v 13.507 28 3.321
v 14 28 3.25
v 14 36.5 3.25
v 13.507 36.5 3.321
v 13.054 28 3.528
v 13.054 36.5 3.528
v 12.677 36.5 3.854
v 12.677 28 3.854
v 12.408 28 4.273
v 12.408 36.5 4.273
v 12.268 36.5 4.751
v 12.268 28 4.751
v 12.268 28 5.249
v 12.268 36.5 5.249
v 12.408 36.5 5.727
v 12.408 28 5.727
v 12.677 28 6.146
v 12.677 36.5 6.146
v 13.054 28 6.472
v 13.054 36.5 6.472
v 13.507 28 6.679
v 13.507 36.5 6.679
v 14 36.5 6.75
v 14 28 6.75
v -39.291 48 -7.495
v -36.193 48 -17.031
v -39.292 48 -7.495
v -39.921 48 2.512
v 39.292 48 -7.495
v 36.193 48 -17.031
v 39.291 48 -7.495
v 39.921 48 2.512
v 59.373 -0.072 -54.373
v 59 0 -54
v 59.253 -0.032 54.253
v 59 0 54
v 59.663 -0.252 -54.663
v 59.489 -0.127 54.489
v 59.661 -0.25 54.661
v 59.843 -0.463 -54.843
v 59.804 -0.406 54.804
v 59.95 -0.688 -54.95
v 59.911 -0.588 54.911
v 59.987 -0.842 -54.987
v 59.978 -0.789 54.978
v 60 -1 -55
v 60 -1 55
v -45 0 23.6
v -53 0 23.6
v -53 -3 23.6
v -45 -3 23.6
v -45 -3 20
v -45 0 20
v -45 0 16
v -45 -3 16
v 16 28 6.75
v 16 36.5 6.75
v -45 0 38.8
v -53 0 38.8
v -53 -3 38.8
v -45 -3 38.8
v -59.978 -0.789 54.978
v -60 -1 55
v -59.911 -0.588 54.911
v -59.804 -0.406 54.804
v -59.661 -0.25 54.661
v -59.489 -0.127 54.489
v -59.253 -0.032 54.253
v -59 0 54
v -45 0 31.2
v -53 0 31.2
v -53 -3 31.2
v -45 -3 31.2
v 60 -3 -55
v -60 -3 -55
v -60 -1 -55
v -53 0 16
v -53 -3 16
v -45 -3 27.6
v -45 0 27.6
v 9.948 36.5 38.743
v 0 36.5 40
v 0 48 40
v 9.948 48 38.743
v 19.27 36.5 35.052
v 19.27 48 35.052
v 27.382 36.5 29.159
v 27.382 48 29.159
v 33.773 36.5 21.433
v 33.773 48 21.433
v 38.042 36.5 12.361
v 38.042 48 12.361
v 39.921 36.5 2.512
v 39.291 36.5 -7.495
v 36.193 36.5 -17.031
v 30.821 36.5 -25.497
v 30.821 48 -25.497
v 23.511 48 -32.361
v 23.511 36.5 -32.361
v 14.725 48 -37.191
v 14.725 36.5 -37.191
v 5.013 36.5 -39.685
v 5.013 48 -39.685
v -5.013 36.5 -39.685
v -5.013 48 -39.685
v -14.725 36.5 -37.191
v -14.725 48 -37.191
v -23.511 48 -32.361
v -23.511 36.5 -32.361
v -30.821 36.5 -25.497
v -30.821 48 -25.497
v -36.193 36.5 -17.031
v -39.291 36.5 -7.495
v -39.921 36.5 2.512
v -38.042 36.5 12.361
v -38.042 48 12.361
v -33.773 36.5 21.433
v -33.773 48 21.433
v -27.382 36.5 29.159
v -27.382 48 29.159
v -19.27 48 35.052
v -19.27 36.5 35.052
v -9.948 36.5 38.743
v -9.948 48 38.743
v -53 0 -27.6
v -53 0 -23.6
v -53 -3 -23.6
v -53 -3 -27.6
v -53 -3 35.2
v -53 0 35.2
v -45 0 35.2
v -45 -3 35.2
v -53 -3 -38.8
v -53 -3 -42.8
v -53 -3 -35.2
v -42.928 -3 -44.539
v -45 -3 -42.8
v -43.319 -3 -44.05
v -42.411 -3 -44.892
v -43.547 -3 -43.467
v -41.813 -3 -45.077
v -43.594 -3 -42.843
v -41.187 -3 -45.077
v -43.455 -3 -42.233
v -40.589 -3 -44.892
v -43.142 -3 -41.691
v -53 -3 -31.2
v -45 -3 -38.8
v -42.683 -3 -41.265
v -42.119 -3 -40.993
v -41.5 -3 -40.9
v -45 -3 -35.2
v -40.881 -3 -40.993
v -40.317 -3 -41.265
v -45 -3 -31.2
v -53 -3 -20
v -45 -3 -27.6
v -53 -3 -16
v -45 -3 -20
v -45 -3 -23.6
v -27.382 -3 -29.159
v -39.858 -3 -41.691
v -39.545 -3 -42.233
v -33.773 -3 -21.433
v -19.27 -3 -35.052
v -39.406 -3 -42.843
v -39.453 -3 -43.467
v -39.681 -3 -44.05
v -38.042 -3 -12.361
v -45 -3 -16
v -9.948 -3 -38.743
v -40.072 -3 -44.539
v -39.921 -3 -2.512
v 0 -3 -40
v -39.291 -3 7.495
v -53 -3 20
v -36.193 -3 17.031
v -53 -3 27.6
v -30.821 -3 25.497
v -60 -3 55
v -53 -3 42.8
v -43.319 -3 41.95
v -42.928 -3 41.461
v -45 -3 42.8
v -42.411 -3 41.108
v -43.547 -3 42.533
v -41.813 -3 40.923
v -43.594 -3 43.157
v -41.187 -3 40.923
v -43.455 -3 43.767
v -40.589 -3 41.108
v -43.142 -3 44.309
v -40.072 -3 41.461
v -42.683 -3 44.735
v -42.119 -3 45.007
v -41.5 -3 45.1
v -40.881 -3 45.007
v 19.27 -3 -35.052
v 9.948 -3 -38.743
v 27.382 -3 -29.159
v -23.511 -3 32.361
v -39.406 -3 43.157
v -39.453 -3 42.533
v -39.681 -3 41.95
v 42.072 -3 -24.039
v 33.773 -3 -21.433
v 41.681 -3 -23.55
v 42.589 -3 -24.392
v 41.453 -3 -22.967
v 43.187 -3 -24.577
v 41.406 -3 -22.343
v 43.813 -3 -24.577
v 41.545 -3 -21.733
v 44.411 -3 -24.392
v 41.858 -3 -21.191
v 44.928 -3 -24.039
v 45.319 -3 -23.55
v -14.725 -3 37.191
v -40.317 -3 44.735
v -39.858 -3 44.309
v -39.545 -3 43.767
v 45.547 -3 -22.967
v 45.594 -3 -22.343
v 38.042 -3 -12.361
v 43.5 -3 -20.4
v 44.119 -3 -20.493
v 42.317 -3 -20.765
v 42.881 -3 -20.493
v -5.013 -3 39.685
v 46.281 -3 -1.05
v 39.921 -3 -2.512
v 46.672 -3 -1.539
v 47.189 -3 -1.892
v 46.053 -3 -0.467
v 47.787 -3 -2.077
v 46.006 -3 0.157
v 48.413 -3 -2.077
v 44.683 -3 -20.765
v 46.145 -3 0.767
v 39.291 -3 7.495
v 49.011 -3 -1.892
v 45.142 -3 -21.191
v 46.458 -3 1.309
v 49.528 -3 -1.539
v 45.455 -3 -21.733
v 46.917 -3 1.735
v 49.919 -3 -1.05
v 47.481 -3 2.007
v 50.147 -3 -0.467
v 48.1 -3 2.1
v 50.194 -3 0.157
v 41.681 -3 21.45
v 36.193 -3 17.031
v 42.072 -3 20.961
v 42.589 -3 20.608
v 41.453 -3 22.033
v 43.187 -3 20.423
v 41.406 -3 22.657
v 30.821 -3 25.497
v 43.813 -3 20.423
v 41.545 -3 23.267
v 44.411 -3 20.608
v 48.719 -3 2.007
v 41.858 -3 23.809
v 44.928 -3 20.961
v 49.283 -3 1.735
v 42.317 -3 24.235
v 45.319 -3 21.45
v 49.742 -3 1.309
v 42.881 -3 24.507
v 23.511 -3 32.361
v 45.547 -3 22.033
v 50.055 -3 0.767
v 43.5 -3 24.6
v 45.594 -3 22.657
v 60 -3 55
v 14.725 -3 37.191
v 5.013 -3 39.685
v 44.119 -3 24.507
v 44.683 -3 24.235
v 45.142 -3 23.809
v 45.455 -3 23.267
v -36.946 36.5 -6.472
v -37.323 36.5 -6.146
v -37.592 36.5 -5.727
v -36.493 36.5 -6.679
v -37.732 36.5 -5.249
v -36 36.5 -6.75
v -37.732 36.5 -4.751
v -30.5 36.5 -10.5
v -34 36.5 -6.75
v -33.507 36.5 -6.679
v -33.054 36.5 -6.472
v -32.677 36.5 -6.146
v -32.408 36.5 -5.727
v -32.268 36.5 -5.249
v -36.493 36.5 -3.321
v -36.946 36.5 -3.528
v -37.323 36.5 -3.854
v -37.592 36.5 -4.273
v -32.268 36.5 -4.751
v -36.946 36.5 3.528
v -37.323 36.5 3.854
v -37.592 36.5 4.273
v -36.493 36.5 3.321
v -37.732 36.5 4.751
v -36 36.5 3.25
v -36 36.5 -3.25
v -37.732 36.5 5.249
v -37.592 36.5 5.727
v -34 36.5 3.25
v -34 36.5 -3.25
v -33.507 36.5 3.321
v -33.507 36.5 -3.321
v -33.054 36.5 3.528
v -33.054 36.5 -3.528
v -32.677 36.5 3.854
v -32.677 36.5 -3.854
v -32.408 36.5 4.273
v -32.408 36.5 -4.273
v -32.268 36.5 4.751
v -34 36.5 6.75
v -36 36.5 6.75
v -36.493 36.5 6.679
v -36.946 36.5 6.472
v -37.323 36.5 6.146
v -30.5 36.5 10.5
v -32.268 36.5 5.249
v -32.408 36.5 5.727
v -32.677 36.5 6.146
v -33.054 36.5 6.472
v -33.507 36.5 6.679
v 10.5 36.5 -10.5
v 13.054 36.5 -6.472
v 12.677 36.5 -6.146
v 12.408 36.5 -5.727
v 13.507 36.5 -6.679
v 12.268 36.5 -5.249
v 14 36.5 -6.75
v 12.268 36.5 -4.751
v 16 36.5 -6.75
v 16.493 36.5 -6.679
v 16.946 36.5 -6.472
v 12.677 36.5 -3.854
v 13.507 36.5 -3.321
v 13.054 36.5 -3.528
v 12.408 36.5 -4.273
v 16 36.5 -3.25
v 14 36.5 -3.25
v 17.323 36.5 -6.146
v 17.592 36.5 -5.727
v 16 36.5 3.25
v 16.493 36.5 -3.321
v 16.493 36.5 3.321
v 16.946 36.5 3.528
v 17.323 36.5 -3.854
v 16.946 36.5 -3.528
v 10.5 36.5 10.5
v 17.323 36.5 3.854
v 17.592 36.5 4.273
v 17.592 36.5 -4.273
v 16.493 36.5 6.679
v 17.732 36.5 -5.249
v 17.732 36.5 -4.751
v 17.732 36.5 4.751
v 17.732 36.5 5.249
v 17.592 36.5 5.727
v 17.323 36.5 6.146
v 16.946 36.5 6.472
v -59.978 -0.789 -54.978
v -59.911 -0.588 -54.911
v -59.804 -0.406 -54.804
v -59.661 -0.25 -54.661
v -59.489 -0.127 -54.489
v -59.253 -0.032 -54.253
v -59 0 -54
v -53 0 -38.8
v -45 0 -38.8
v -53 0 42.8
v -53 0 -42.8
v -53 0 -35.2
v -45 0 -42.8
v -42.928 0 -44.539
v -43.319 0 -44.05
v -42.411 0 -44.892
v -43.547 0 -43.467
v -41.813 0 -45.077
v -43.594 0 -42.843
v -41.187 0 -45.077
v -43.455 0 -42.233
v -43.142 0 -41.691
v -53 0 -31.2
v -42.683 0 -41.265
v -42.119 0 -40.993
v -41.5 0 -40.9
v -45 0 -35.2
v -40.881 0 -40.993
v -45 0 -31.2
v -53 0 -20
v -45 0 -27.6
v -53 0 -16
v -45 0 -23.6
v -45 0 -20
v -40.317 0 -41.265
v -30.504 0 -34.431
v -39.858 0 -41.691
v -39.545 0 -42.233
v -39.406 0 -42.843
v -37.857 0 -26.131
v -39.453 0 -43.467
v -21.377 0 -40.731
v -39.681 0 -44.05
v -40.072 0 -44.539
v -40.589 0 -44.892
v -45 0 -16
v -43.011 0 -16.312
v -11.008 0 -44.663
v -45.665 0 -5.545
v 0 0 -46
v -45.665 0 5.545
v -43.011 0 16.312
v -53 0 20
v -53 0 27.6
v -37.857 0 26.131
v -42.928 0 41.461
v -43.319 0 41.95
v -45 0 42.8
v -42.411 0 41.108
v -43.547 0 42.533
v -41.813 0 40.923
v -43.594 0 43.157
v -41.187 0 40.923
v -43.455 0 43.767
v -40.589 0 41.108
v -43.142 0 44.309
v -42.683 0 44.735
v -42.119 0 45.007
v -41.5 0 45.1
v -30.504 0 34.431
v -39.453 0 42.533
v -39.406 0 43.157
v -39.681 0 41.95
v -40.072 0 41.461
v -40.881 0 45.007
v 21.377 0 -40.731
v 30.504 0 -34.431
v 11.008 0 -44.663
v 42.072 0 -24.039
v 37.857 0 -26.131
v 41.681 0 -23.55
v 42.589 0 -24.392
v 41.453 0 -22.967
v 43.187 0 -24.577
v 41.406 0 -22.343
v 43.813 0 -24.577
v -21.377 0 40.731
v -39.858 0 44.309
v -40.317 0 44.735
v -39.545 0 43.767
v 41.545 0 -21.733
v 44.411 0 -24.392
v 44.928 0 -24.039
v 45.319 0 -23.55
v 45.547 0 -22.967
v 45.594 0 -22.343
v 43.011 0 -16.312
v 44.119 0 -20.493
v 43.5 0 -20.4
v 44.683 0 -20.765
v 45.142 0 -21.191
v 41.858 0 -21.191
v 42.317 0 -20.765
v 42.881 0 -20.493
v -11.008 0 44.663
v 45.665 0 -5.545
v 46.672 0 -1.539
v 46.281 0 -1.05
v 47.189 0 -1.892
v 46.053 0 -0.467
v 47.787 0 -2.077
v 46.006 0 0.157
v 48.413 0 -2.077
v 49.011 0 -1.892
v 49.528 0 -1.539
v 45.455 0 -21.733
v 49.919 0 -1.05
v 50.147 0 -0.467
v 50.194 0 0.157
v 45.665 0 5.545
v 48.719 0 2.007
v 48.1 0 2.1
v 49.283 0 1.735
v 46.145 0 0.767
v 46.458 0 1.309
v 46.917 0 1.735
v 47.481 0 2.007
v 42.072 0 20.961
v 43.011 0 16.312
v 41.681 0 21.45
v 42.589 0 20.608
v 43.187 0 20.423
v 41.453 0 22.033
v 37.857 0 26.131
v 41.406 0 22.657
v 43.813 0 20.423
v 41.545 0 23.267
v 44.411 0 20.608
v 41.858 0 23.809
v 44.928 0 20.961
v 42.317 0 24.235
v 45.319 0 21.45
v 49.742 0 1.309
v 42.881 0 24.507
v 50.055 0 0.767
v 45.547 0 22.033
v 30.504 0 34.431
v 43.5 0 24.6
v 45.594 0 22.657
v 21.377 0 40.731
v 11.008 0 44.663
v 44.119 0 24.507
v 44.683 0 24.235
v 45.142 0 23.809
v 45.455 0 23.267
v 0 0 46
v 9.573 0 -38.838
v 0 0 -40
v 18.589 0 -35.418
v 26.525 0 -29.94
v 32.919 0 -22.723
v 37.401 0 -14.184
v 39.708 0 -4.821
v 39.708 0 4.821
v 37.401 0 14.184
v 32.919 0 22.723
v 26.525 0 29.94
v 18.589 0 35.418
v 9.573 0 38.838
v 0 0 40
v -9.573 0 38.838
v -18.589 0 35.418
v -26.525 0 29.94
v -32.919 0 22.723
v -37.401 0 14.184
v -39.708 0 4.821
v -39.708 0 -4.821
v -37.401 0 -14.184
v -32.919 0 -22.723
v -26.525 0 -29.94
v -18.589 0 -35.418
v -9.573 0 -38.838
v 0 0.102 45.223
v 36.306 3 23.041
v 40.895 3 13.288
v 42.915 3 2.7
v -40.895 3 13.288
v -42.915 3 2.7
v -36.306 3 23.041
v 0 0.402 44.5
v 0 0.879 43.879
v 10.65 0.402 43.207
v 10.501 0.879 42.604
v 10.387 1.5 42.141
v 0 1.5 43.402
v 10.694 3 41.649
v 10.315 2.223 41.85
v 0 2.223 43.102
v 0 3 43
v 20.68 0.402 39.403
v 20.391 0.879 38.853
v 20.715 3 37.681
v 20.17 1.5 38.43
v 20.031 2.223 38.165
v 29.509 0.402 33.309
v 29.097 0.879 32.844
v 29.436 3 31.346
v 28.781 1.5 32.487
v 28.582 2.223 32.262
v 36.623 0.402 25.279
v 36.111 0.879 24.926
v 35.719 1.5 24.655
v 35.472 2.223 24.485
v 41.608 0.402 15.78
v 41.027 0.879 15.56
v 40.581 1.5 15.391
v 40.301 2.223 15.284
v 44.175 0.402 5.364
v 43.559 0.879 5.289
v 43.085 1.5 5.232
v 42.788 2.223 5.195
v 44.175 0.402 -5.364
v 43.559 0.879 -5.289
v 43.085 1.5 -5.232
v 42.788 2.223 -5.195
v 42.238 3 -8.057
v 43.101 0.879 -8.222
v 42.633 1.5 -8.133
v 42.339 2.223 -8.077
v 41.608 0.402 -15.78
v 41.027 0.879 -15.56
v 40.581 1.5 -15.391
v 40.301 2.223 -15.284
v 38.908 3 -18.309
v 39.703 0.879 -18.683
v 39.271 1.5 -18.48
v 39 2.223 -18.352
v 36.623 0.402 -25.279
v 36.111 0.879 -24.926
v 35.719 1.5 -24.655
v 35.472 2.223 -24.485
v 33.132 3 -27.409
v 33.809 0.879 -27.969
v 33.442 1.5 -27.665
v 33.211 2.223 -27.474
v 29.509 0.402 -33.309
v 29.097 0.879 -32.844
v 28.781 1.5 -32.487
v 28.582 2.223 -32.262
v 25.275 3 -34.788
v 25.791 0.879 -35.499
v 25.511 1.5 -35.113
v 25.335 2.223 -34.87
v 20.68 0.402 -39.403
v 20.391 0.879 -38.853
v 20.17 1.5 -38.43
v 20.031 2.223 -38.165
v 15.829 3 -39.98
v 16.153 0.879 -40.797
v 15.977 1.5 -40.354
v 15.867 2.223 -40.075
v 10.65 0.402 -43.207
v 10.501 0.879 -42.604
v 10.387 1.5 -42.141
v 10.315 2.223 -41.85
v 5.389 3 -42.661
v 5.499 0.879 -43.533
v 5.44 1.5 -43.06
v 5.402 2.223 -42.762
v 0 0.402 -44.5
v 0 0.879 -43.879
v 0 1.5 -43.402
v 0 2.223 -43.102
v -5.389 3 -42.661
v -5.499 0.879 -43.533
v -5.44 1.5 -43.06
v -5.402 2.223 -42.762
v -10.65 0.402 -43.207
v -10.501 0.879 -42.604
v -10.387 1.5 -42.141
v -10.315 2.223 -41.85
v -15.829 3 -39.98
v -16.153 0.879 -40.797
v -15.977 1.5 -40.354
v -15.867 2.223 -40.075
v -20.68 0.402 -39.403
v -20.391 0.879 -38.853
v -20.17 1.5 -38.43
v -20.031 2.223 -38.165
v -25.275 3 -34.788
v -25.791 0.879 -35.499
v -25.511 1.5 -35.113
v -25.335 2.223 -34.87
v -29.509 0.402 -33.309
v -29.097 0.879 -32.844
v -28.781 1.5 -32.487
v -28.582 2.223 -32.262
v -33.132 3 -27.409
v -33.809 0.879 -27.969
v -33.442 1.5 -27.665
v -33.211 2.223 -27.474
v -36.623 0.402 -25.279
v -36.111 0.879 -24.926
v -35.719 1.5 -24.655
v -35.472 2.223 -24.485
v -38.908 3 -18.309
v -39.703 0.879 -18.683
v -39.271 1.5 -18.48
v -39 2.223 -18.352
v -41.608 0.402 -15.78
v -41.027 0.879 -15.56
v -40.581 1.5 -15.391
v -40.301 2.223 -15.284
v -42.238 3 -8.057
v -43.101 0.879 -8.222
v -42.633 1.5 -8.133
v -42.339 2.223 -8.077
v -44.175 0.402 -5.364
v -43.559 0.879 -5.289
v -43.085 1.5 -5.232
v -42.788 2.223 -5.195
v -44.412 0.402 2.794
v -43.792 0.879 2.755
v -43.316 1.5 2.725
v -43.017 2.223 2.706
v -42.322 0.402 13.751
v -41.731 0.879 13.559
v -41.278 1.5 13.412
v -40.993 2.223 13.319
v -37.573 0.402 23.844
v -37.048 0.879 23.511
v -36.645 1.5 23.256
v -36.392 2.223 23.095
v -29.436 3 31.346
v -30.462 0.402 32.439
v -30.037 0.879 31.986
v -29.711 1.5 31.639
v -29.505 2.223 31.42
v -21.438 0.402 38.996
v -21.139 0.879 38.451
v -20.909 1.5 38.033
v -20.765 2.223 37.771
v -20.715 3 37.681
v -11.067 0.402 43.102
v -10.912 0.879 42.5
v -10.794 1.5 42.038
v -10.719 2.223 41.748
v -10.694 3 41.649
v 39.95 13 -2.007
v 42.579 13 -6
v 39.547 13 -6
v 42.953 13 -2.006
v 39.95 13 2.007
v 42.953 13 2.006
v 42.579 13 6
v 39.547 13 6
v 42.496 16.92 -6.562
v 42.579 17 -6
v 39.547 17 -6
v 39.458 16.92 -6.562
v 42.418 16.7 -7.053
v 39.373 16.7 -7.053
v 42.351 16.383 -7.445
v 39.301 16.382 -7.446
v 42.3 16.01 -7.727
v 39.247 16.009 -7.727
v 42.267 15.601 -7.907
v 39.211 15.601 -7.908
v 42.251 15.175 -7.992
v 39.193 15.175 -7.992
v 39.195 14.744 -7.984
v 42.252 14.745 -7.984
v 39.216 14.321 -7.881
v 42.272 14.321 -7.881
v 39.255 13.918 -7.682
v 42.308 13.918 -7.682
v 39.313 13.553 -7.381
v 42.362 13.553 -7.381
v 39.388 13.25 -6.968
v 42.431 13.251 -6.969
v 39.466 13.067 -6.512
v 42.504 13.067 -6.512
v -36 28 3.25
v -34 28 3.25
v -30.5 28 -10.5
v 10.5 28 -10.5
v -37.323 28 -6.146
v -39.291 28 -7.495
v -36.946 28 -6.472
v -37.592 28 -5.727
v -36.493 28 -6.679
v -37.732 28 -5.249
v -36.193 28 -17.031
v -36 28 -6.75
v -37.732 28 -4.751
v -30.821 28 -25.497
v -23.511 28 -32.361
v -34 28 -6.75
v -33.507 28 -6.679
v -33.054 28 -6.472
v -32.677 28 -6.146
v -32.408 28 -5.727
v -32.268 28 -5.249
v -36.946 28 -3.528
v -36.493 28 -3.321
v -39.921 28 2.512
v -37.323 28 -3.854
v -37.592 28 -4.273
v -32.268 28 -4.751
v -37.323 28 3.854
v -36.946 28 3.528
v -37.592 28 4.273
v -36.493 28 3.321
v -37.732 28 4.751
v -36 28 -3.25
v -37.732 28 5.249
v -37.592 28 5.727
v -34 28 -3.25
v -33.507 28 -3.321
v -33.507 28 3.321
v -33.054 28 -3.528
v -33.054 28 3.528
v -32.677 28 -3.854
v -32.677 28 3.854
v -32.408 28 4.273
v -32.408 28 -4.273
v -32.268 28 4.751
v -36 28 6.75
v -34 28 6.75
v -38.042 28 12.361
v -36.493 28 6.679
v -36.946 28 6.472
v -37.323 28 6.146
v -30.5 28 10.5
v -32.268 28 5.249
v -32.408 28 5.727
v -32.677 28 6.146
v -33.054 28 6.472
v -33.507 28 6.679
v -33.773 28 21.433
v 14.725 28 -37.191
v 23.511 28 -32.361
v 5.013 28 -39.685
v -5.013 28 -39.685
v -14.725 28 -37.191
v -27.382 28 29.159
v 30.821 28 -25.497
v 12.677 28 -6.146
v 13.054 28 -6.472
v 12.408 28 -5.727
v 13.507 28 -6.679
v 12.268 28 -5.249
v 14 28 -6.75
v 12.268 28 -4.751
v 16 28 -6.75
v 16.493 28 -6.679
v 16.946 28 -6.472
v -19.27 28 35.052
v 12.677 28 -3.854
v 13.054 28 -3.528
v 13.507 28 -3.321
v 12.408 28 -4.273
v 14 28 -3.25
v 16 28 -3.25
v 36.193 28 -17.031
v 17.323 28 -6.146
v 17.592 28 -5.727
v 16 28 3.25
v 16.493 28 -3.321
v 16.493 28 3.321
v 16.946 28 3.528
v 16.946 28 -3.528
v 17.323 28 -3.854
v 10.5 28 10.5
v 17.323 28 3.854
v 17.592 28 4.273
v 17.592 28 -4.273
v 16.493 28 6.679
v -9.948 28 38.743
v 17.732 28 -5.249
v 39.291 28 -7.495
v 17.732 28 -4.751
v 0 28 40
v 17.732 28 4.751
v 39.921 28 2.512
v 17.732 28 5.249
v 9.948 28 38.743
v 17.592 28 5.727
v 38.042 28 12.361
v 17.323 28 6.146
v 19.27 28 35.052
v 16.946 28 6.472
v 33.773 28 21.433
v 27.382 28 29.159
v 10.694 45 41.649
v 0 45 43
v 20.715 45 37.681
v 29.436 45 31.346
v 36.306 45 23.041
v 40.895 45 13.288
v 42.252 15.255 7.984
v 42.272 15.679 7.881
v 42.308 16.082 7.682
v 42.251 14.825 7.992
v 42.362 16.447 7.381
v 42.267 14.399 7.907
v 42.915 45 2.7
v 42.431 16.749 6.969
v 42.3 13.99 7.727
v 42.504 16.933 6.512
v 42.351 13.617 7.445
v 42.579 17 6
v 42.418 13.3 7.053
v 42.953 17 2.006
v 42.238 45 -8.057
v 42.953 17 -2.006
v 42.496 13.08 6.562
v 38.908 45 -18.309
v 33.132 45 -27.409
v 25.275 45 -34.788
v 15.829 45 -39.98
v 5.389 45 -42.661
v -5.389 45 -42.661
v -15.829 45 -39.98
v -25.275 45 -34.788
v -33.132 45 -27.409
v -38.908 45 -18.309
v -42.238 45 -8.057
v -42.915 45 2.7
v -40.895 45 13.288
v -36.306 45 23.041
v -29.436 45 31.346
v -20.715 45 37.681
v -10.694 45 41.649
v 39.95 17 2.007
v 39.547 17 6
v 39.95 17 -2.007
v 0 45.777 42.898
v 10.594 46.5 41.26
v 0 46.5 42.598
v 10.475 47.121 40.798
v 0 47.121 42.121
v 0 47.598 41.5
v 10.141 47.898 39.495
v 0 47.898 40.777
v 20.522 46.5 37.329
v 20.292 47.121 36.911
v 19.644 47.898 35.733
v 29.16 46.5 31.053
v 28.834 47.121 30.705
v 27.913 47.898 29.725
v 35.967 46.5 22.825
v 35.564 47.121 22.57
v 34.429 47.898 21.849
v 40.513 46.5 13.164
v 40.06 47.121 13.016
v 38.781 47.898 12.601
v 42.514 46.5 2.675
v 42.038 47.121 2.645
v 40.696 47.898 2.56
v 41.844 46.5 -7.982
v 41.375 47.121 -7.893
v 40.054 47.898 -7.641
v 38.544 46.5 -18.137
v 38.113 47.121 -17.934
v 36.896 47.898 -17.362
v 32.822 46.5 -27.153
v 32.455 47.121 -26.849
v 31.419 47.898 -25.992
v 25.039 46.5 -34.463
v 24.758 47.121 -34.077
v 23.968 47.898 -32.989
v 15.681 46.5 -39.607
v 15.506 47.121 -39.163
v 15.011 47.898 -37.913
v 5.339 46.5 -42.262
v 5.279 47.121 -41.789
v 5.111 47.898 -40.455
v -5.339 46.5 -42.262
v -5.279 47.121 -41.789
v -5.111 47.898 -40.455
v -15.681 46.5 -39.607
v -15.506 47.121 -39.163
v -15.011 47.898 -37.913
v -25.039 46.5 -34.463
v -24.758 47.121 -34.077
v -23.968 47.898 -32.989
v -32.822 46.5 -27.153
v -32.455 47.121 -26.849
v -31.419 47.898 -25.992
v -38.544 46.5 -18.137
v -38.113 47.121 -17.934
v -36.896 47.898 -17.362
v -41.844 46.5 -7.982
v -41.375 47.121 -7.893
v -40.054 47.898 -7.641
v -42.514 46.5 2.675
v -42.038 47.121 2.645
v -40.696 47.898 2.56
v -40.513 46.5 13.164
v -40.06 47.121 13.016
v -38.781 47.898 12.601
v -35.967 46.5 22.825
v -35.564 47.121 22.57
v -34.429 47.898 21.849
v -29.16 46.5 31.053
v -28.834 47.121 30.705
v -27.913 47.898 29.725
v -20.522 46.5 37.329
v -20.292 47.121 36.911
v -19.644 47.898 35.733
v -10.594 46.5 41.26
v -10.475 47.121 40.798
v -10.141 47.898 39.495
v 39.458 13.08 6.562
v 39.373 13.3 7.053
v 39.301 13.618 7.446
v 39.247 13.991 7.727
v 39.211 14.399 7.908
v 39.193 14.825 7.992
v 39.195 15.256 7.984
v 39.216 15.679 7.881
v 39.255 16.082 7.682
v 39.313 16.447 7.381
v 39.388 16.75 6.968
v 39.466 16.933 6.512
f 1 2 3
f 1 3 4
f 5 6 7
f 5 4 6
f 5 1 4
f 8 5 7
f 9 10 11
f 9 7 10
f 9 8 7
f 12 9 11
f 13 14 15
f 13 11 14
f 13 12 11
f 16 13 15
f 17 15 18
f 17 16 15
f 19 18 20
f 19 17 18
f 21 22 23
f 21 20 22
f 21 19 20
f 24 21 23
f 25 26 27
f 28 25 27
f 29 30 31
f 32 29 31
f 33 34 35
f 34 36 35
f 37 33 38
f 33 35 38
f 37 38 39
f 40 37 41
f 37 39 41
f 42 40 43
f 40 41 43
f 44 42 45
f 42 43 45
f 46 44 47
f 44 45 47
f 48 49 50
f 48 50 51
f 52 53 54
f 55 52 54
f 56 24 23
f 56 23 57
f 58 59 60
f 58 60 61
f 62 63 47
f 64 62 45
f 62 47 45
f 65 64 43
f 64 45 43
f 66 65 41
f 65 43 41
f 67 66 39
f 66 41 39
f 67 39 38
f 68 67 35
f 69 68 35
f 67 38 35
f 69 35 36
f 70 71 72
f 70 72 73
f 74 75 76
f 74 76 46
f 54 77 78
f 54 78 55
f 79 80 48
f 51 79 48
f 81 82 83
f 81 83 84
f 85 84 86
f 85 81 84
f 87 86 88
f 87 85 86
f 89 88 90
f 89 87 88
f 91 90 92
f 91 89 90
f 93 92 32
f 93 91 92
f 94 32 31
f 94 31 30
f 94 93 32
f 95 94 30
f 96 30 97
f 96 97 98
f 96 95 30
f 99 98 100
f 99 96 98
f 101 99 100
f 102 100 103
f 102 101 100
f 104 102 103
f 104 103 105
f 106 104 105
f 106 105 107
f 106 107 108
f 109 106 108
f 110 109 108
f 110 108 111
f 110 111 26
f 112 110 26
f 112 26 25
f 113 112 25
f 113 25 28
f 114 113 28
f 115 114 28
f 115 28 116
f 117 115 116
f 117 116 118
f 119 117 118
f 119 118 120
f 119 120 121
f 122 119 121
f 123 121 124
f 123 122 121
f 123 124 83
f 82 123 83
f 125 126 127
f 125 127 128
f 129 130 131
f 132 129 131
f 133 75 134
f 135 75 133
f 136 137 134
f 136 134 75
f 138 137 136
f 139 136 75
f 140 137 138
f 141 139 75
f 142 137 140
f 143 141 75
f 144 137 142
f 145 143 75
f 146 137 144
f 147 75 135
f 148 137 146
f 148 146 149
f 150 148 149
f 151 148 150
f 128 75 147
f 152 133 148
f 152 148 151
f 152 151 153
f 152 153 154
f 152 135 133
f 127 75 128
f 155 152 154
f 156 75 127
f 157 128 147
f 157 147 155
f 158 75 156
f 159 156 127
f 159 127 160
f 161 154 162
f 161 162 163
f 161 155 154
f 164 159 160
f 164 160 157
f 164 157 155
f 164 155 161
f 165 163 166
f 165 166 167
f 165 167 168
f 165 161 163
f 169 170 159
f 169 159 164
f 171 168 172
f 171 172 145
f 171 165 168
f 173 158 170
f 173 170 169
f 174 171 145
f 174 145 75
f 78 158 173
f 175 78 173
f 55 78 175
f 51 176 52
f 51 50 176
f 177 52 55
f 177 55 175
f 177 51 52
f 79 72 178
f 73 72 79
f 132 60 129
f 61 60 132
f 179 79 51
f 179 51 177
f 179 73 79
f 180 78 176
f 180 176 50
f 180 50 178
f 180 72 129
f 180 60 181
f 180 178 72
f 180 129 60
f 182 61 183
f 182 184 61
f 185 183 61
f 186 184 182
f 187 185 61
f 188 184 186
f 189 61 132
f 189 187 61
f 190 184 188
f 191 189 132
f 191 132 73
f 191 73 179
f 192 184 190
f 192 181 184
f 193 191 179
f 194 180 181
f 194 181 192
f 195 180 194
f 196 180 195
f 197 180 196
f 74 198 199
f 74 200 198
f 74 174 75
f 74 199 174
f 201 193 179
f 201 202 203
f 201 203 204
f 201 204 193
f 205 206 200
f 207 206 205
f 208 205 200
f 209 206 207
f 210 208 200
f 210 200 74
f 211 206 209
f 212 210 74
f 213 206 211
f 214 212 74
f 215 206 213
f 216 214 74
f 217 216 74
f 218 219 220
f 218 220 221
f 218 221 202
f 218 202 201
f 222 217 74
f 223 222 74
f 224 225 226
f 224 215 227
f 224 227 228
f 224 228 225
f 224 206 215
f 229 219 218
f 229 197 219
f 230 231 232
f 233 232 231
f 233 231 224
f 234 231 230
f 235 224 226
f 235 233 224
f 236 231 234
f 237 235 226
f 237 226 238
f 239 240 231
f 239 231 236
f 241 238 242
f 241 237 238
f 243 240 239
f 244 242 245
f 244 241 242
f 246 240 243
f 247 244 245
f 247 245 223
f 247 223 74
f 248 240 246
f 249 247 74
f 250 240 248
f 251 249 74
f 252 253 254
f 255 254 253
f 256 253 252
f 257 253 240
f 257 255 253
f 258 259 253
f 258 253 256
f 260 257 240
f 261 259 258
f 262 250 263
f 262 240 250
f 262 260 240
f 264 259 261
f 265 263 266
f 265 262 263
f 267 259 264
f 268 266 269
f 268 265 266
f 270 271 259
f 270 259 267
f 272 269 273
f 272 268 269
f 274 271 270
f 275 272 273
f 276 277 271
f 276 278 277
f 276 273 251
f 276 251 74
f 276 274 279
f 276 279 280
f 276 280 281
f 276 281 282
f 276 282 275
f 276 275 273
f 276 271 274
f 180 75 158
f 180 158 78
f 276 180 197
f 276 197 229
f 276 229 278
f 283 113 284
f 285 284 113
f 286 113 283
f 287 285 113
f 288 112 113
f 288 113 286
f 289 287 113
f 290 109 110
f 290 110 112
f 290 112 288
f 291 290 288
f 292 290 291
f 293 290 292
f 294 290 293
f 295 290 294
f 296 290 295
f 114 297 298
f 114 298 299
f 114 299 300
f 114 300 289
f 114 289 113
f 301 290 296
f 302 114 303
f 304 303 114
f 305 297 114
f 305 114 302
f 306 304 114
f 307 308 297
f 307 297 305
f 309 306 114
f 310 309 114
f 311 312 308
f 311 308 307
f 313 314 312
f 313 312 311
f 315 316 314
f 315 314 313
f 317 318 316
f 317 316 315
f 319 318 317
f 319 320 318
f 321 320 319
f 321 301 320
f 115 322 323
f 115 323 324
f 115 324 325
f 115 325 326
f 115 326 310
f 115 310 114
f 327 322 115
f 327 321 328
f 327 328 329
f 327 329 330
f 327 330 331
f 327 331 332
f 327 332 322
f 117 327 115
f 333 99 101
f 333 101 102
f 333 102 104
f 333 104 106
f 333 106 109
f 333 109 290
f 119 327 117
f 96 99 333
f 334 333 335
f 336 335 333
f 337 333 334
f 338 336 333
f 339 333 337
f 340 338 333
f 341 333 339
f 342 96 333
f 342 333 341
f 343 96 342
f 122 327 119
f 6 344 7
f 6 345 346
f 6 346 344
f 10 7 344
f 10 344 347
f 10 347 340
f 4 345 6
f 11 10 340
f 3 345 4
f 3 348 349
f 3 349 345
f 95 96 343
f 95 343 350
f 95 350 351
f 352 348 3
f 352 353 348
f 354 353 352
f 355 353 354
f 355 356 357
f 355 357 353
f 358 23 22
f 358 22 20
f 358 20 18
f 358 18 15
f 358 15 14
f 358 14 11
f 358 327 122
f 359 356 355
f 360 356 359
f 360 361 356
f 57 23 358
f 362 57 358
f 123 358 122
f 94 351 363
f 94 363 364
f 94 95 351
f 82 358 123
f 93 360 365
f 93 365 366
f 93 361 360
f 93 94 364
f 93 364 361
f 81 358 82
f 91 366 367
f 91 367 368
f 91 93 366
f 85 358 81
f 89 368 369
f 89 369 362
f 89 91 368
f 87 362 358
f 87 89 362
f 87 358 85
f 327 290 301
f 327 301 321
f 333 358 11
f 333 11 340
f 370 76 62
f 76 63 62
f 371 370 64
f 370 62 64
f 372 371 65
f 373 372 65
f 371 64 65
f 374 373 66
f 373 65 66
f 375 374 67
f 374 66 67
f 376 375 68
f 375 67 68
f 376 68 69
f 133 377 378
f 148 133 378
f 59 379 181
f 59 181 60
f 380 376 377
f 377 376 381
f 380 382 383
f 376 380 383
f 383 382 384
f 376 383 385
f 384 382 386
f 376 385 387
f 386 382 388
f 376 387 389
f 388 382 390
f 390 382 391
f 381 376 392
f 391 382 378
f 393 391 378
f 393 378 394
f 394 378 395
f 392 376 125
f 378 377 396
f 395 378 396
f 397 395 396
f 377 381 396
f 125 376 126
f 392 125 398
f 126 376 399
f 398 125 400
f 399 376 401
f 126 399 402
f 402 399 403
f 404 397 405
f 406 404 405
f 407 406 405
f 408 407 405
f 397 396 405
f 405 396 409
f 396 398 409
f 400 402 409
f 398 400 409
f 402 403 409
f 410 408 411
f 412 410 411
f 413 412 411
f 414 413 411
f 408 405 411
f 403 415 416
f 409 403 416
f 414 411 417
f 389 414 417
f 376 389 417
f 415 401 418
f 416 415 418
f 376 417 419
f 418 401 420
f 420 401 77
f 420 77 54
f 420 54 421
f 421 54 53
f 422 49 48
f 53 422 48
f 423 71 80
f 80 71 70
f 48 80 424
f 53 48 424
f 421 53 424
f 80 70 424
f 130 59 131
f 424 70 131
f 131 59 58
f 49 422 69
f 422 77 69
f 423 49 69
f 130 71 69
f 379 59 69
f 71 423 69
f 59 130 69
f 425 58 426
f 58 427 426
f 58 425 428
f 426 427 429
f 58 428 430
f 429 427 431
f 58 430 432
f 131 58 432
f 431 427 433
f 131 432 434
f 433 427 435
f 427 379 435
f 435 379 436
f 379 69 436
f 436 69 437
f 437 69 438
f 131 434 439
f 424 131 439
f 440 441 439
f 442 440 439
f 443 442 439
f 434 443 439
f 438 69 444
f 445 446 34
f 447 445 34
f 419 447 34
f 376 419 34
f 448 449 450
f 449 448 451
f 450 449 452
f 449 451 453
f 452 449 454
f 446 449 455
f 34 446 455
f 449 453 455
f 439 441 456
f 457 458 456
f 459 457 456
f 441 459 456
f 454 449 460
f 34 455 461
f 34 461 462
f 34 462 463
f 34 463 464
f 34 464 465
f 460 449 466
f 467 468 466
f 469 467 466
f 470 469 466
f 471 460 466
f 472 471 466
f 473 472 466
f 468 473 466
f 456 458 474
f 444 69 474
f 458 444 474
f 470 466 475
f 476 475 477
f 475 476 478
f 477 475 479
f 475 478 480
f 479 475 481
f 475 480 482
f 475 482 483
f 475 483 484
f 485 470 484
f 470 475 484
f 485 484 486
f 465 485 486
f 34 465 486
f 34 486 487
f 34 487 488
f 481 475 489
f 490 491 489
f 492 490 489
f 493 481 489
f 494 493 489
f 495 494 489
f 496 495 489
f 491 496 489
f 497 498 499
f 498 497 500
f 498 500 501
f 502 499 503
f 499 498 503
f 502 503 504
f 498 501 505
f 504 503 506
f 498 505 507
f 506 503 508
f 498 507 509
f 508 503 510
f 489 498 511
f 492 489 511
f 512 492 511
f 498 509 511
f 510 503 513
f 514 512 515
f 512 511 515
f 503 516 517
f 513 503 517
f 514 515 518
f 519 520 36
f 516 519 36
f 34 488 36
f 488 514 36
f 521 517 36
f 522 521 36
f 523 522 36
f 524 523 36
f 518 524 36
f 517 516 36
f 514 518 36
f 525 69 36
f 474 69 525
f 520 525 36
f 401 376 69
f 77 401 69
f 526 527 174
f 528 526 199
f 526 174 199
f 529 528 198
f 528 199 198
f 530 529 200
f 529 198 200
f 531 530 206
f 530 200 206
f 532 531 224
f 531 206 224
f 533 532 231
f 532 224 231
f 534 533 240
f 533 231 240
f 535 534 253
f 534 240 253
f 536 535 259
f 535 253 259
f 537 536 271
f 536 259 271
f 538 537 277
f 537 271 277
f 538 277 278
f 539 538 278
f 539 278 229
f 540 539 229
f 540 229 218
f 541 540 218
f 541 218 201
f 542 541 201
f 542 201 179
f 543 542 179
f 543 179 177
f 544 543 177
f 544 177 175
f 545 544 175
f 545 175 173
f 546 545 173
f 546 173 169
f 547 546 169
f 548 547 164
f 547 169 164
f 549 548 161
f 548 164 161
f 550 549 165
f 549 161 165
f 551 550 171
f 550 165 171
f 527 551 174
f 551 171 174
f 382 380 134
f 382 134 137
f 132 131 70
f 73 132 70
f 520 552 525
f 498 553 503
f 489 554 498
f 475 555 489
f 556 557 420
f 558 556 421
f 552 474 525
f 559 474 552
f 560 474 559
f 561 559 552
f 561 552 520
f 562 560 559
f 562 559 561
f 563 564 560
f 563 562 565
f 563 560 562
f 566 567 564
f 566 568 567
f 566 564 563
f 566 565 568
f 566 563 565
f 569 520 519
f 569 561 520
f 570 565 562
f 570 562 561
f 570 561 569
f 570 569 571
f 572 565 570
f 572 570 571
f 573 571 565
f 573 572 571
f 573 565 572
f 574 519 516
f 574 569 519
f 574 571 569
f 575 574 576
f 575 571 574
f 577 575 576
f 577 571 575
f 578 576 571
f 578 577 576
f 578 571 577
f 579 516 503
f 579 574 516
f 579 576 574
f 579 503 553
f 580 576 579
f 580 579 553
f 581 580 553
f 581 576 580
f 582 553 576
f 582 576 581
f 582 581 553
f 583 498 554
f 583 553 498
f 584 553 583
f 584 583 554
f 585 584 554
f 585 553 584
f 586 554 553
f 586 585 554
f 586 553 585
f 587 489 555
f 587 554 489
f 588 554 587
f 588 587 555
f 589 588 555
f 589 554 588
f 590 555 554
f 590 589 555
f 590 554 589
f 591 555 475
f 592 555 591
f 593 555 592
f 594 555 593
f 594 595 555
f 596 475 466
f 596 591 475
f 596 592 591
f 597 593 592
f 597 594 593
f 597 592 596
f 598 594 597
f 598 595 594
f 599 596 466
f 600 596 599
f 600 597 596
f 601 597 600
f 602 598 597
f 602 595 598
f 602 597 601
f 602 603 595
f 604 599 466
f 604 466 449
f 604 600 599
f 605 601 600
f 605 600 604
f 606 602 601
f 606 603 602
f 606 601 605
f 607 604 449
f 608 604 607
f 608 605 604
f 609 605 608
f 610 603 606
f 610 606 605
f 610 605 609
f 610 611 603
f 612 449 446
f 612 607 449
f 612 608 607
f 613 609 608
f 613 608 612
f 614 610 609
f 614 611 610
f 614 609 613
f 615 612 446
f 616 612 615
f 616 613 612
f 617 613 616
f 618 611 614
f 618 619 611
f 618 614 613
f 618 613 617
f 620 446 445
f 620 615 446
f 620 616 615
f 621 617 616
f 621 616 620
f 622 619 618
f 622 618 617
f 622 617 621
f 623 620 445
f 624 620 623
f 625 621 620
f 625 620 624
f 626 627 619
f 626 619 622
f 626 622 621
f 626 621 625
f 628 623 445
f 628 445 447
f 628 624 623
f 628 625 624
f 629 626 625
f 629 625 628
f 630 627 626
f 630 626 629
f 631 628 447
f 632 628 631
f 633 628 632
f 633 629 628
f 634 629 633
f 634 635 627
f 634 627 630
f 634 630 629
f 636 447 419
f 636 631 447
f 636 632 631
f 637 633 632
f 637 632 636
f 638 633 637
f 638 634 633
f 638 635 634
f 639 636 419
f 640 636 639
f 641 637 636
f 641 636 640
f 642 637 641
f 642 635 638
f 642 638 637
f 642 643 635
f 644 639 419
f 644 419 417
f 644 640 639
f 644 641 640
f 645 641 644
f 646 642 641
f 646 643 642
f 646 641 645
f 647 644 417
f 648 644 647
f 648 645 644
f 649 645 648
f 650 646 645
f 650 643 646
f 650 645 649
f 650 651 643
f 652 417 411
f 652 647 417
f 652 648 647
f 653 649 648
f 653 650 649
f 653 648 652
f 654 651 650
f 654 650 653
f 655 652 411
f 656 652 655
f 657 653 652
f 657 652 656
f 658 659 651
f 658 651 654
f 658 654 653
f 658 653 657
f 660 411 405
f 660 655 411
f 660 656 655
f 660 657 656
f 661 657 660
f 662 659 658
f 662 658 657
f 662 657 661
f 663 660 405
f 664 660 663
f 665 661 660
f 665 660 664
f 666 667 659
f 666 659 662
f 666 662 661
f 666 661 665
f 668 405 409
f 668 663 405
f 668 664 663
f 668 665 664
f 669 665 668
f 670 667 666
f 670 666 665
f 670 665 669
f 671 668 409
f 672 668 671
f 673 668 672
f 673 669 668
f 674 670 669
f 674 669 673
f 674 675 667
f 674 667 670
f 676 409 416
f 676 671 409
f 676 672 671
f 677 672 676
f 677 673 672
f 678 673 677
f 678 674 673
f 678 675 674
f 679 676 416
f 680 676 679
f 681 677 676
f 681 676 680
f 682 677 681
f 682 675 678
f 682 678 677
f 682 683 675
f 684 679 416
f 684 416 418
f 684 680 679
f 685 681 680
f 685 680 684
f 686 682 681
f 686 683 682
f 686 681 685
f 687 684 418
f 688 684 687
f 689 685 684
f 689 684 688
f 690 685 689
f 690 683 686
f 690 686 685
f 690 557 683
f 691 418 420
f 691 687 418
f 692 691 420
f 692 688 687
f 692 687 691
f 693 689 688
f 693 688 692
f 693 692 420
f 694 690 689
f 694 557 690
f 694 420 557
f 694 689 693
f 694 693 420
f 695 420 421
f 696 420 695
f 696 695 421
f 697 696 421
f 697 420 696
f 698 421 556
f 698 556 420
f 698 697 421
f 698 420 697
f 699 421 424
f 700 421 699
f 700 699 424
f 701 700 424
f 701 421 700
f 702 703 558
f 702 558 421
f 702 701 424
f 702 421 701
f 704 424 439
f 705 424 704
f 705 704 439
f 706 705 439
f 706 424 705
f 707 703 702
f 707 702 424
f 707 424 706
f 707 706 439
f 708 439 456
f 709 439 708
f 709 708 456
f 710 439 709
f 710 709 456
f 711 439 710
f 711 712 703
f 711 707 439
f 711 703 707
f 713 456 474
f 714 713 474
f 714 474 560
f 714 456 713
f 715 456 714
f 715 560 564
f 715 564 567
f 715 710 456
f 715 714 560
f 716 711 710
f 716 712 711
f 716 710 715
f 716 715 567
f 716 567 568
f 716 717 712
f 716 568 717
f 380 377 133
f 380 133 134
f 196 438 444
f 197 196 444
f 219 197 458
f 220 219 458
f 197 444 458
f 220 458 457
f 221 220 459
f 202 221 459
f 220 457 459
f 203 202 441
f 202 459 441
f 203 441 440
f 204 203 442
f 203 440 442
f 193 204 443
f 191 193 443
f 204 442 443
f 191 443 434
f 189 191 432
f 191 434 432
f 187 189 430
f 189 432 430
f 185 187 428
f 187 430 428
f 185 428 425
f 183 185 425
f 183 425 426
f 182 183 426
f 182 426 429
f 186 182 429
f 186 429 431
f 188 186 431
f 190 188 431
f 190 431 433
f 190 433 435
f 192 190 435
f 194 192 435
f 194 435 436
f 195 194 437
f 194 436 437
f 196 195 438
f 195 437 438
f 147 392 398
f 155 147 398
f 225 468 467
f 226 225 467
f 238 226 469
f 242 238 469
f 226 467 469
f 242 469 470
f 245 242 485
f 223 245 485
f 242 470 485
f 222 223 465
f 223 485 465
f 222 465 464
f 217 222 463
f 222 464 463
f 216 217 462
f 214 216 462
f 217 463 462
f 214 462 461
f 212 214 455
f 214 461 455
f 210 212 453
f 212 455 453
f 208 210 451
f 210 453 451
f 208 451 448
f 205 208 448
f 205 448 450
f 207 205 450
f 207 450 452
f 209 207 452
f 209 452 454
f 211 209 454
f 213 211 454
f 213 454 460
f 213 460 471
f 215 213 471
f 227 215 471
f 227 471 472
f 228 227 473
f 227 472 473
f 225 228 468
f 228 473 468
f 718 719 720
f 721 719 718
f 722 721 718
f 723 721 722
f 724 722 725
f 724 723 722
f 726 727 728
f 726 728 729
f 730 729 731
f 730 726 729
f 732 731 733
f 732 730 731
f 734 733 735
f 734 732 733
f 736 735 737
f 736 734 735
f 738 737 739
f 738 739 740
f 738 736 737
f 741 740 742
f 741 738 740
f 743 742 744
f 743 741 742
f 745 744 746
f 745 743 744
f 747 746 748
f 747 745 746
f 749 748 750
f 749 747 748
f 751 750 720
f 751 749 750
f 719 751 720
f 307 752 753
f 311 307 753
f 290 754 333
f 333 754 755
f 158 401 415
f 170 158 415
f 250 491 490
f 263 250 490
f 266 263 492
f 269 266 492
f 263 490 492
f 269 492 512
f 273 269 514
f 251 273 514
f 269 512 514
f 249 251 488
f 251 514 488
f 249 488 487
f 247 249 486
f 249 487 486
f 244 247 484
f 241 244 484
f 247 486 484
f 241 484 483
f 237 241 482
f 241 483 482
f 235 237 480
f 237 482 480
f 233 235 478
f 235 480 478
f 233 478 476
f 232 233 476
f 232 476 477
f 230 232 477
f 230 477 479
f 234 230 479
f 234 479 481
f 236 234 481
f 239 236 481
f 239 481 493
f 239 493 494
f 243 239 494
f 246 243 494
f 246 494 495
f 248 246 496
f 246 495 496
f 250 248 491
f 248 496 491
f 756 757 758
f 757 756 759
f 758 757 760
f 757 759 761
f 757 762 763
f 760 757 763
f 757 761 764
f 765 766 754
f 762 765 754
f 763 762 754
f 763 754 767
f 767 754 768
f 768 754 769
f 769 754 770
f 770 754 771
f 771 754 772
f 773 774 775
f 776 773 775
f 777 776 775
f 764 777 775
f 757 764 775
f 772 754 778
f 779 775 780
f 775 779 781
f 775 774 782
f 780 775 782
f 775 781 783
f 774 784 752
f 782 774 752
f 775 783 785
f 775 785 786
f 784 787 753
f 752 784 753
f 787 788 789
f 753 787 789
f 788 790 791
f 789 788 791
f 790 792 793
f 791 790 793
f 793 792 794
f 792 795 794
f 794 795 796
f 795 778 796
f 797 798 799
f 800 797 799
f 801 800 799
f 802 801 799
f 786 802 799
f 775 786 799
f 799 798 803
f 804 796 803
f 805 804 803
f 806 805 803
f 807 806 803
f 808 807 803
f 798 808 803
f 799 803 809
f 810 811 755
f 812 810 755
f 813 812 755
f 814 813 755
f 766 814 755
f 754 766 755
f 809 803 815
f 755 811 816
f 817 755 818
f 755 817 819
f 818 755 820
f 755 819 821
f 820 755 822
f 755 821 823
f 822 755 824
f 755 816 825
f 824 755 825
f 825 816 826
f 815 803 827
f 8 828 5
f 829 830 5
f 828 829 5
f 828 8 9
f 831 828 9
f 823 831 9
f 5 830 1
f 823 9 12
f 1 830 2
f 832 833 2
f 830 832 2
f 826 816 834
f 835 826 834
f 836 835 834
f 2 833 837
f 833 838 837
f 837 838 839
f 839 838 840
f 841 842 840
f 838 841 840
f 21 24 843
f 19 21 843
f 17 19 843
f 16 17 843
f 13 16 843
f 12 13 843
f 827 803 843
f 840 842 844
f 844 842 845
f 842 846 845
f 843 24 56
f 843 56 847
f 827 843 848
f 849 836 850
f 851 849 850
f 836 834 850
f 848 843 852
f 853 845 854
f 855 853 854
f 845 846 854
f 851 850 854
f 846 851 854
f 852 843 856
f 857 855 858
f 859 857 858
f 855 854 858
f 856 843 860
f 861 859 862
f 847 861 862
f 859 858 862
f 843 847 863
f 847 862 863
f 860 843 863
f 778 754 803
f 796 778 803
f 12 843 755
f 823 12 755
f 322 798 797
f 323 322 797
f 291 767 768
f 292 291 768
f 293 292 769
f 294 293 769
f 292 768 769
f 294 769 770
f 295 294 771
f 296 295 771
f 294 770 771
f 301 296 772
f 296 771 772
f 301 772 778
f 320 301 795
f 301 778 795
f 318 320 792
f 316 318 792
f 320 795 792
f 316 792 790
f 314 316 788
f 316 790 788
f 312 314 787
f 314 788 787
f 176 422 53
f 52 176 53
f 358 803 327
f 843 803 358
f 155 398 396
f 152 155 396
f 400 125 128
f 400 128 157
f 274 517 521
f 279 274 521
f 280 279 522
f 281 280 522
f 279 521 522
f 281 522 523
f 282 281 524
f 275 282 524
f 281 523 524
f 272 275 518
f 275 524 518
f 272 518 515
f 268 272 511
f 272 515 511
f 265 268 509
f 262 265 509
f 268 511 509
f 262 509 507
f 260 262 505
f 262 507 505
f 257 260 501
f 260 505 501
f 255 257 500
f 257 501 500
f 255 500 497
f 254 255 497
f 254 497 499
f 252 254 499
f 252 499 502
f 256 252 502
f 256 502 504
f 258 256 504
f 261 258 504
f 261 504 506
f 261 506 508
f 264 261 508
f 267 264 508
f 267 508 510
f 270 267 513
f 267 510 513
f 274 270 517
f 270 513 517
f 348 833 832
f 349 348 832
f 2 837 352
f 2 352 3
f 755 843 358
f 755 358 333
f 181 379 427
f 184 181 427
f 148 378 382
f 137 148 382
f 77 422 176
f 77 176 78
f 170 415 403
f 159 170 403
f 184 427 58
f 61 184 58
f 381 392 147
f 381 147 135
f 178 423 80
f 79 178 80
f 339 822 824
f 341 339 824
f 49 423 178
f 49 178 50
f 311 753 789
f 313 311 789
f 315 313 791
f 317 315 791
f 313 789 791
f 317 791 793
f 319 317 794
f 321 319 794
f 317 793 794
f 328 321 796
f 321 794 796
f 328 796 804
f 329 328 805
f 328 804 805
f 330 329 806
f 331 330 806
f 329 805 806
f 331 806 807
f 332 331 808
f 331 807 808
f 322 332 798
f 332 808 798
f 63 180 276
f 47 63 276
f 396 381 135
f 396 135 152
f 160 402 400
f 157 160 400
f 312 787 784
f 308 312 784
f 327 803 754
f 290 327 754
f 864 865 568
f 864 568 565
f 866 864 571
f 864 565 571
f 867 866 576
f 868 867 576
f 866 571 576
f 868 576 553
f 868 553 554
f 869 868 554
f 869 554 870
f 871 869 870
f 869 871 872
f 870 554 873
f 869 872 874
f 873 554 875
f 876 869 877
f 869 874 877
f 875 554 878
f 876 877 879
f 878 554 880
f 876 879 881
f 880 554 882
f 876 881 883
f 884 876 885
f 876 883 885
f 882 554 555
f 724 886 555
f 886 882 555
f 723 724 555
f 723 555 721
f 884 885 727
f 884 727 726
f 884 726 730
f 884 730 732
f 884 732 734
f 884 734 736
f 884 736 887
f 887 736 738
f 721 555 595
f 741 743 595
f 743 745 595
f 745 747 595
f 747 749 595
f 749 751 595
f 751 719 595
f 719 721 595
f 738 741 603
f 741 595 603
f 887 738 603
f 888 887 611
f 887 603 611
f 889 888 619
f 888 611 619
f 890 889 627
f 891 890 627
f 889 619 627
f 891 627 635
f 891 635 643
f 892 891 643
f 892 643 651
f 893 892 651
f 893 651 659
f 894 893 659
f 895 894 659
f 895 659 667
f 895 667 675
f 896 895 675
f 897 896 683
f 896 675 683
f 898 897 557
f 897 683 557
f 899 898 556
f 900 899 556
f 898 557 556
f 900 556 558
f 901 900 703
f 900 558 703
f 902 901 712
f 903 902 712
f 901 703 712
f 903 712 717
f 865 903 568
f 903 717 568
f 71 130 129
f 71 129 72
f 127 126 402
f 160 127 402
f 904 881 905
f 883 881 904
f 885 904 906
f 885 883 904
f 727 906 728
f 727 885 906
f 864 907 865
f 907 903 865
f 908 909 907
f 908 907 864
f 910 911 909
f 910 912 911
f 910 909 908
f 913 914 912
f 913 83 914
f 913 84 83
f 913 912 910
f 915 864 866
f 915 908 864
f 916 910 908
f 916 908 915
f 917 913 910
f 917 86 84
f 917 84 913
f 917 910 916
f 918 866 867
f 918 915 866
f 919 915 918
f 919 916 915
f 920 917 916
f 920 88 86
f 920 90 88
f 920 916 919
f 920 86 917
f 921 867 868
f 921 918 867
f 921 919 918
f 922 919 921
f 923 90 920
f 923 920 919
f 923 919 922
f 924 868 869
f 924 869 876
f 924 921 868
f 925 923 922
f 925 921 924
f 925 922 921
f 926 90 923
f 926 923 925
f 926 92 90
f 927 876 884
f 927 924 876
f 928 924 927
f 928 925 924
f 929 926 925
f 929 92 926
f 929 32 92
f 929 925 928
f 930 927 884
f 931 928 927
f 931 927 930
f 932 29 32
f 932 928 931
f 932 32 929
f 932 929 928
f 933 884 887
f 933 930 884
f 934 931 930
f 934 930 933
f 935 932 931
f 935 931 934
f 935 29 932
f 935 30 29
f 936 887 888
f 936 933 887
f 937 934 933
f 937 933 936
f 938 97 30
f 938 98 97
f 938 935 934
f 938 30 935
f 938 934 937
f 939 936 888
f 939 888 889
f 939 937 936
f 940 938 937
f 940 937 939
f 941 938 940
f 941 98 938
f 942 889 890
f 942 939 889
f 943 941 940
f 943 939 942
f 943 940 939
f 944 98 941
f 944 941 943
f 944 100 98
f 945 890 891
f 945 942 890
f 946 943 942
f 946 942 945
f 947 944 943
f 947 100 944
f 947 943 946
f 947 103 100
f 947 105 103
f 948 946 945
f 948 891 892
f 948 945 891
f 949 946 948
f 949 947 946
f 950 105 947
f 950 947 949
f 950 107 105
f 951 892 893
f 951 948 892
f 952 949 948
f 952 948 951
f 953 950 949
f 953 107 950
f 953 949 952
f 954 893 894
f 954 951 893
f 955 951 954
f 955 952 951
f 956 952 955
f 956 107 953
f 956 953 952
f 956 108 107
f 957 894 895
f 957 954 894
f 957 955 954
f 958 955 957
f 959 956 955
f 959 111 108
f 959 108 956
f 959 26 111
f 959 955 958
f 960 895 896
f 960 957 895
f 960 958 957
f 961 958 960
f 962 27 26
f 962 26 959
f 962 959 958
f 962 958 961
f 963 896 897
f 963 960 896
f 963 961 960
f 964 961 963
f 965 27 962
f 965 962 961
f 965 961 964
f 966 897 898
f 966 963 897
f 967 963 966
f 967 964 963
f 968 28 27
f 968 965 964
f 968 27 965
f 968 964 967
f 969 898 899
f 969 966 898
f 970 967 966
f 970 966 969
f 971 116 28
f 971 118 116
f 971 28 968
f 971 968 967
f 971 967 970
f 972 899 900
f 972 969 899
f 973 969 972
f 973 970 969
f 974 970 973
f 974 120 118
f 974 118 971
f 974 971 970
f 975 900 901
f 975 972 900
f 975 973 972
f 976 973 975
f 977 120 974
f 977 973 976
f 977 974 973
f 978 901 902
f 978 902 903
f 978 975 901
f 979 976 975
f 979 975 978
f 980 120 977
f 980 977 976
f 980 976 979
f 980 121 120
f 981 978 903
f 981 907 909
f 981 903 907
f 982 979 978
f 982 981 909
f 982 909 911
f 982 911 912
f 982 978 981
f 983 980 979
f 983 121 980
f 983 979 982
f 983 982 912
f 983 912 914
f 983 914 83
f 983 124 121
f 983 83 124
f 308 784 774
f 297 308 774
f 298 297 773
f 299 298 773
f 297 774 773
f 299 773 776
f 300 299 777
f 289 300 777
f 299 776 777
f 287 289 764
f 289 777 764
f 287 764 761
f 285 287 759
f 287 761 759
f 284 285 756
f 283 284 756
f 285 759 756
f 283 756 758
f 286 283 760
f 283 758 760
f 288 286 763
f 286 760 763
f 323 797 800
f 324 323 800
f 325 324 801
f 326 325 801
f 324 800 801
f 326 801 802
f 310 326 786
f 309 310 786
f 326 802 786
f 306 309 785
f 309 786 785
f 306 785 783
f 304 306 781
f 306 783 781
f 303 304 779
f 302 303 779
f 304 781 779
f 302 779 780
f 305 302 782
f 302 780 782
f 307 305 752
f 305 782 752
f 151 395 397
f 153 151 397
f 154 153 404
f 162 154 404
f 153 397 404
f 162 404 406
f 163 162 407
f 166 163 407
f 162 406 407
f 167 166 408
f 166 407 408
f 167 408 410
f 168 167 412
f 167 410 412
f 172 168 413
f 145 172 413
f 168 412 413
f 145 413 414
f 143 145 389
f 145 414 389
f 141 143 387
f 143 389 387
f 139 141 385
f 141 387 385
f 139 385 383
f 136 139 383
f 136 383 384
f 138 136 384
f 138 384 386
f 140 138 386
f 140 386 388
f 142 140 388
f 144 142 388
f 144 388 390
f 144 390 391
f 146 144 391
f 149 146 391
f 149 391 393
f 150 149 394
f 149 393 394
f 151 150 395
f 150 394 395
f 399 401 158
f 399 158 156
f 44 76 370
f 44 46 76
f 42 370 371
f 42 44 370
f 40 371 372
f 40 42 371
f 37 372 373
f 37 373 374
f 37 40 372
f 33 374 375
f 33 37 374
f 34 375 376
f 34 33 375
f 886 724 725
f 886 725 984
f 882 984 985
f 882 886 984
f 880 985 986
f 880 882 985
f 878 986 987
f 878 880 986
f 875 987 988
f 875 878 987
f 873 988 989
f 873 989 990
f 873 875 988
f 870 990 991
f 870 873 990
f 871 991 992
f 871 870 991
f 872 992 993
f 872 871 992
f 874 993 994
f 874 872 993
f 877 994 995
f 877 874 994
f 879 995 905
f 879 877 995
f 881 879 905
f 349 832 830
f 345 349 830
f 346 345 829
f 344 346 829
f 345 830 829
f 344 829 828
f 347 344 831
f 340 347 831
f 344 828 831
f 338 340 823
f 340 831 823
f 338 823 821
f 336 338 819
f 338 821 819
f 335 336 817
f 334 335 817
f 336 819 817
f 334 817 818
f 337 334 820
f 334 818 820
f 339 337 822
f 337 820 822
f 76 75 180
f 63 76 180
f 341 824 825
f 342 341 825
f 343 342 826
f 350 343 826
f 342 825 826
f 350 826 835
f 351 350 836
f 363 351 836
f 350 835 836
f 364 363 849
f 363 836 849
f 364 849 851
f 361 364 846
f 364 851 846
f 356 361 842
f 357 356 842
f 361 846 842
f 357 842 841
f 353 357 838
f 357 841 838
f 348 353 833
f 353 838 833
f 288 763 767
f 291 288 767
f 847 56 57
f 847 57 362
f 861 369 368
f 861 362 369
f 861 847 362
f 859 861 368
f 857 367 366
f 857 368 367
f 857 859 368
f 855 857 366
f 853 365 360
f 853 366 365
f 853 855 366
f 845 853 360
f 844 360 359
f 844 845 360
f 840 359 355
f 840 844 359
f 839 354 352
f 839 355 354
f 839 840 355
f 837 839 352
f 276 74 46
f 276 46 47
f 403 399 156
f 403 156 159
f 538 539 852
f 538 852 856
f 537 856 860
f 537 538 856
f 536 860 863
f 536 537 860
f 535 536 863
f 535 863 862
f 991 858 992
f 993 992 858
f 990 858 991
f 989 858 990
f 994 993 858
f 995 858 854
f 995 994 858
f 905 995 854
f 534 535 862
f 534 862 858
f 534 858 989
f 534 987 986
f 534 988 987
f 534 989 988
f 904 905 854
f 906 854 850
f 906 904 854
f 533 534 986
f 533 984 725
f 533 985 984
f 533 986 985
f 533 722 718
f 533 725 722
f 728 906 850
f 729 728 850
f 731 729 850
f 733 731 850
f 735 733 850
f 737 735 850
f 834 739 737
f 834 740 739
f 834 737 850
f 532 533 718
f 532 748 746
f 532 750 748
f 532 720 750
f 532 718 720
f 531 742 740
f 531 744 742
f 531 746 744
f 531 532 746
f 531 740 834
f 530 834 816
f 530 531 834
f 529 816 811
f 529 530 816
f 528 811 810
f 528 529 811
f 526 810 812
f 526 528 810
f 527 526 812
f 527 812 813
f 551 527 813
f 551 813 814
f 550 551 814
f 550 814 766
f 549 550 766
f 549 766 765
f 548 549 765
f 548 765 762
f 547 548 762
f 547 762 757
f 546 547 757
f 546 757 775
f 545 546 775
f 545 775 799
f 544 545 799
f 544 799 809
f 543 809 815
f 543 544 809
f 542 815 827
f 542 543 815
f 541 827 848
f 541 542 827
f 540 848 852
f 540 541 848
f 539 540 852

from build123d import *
from OCP.BRepFilletAPI import BRepFilletAPI_MakeFillet
from build123d.topology import SkipClean

# Parameters (mm, degrees)
SKETCH2_R               = 43
SKETCH2_R_2             = 40
BOSS_EXTRUDE1_DEPTH     = 48
SKETCH3_R               = 40
BOSS_EXTRUDE2_DEPTH     = 8.5
CUT_EXTRUDE1_DEPTH      = 71.924255371
CUT_EXTRUDE1_DEPTH_BACK = 71.924255371
SKETCH4_W               = 41
SKETCH4_H               = 21
CUT_EXTRUDE2_DEPTH      = 5
BOSS_EXTRUDE3_START     = 3
SKETCH6_W               = 120
SKETCH6_H               = 110
SKETCH6_R               = 40
BOSS_EXTRUDE3_DEPTH     = 3
FILLET1_R               = 3
FILLET1_R_2             = 1
SKETCH7_R               = 2.1
SKETCH7_W               = 8
SKETCH7_H               = 4
CUT_EXTRUDE3_DEPTH      = 3


with BuildPart() as part:
    # Sketch2 → Boss-Extrude1 (new body)
    with BuildSketch(Plane(origin=(0, 0, 0), x_dir=(1, 0, 0), z_dir=(0, 1, 0))):
        with Locations(Location((0, 0, 0), (0, 0, 270))):
            Circle(SKETCH2_R)
        with Locations(Location((0, 0, 0), (0, 0, 270))):
            Circle(SKETCH2_R_2, mode=Mode.SUBTRACT)
    extrude(amount=BOSS_EXTRUDE1_DEPTH)

    # Sketch3 → Boss-Extrude2 (add)
    with BuildSketch(Plane(origin=(0, 28, 0), x_dir=(1, 0, 0), z_dir=(0, 1, 0))):
        with Locations(Location((0, 0, 0), (0, 0, 270))):
            Circle(SKETCH3_R)
    extrude(amount=BOSS_EXTRUDE2_DEPTH)

    # Sketch4 → Cut-Extrude1 (cut, two sides: drawn at the far end of the back side and taken through both)
    with BuildSketch(Plane(origin=(0, 36.5, 0), x_dir=(1, 0, 0), z_dir=(0, 1, 0)).offset(-CUT_EXTRUDE1_DEPTH_BACK)):
        with BuildLine():
            Line((14, 6.75), (16, 6.75))
            ThreePointArc((16, 6.75), (17.75, 5), (16, 3.25))
            Line((16, 3.25), (14, 3.25))
            ThreePointArc((14, 3.25), (12.25, 5), (14, 6.75))
        make_face()
        with Locations((-10, 0)):
            Rectangle(SKETCH4_W, SKETCH4_H)
        with BuildLine():
            Line((-36, 6.75), (-34, 6.75))
            ThreePointArc((-34, 6.75), (-32.25, 5), (-34, 3.25))
            Line((-34, 3.25), (-36, 3.25))
            ThreePointArc((-36, 3.25), (-37.75, 5), (-36, 6.75))
        make_face()
        with BuildLine():
            Line((-36, -3.25), (-34, -3.25))
            ThreePointArc((-34, -3.25), (-32.25, -5), (-34, -6.75))
            Line((-34, -6.75), (-36, -6.75))
            ThreePointArc((-36, -6.75), (-37.75, -5), (-36, -3.25))
        make_face()
        with BuildLine():
            Line((14, -6.75), (16, -6.75))
            ThreePointArc((16, -6.75), (17.75, -5), (16, -3.25))
            Line((16, -3.25), (14, -3.25))
            ThreePointArc((14, -3.25), (12.25, -5), (14, -6.75))
        make_face()
    extrude(amount=CUT_EXTRUDE1_DEPTH + CUT_EXTRUDE1_DEPTH_BACK, mode=Mode.SUBTRACT)

    # Sketch5 → Cut-Extrude2 (cut)
    with BuildSketch(Plane(origin=(43, 0, 0), x_dir=(0, 0, -1), z_dir=(1, 0, 0))):
        with BuildLine():
            Line((-6, 17), (6, 17))
            ThreePointArc((6, 17), (8, 15), (6, 13))
            Line((6, 13), (-6, 13))
            ThreePointArc((-6, 13), (-8, 15), (-6, 17))
        make_face()
    extrude(amount=-CUT_EXTRUDE2_DEPTH, mode=Mode.SUBTRACT)

    # Sketch6 → Boss-Extrude3 (add)
    with SkipClean():  # the faces are left unmerged after this step: merging them gives an invalid solid
        with BuildSketch(Plane.XZ.offset(BOSS_EXTRUDE3_START)):
            Rectangle(SKETCH6_W, SKETCH6_H)
            with Locations(Location((0, 0, 0), (0, 0, 270))):
                Circle(SKETCH6_R, mode=Mode.SUBTRACT)
        extrude(amount=-BOSS_EXTRUDE3_DEPTH)

    # Fillet1
    fillet1_edges_1 = [part.edges().sort_by_distance(p)[0] for p in [
        (0, 48, -43),
        (0, 0, -43),
    ]]
    fillet1_edges_2 = [part.edges().sort_by_distance(p)[0] for p in [
        (0, 0, 55),
        (60, 0, 0),
        (-60, 0, 0),
        (0, 0, -55),
    ]]
    fillet1 = BRepFilletAPI_MakeFillet(part.part.solid().wrapped)
    for e in fillet1_edges_1:
        fillet1.Add(FILLET1_R - 0.0001, e.wrapped)
    for e in fillet1_edges_2:
        fillet1.Add(FILLET1_R_2 - 0.0001, e.wrapped)
    add(Compound.cast(fillet1.Shape()), mode=Mode.REPLACE)  # a hair under: the kernel refuses the full size

    # Sketch7 → Cut-Extrude3 (cut)
    with BuildSketch(Plane(origin=(0, 0, 0), x_dir=(1, 0, 0), z_dir=(0, 1, 0))):
        with Locations(Location((-41.5, 43, 0), (0, 0, 270))):
            Circle(SKETCH7_R)
        with Locations(Location((43.5, 22.5, 0), (0, 0, 270))):
            Circle(SKETCH7_R)
        with Locations(Location((43.5, -22.5, 0), (0, 0, 270))):
            Circle(SKETCH7_R)
        with Locations(Location((-41.5, -43, 0), (0, 0, 270))):
            Circle(SKETCH7_R)
        with Locations(Location((48.1, 0, 0), (0, 0, 270))):
            Circle(SKETCH7_R)
        with Locations((-49, 25.6)):
            Rectangle(SKETCH7_W, SKETCH7_H)
        with Locations((-49, 18)):
            Rectangle(SKETCH7_W, SKETCH7_H)
        with Locations((-49, 33.2)):
            Rectangle(SKETCH7_W, SKETCH7_H)
        with Locations((-49, 40.8)):
            Rectangle(SKETCH7_W, SKETCH7_H)
        with Locations((-49, -40.8)):
            Rectangle(SKETCH7_W, SKETCH7_H)
        with Locations((-49, -33.2)):
            Rectangle(SKETCH7_W, SKETCH7_H)
        with Locations((-49, -25.6)):
            Rectangle(SKETCH7_W, SKETCH7_H)
        with Locations((-49, -18)):
            Rectangle(SKETCH7_W, SKETCH7_H)
    extrude(amount=-CUT_EXTRUDE3_DEPTH, mode=Mode.SUBTRACT)


solid = part.part
